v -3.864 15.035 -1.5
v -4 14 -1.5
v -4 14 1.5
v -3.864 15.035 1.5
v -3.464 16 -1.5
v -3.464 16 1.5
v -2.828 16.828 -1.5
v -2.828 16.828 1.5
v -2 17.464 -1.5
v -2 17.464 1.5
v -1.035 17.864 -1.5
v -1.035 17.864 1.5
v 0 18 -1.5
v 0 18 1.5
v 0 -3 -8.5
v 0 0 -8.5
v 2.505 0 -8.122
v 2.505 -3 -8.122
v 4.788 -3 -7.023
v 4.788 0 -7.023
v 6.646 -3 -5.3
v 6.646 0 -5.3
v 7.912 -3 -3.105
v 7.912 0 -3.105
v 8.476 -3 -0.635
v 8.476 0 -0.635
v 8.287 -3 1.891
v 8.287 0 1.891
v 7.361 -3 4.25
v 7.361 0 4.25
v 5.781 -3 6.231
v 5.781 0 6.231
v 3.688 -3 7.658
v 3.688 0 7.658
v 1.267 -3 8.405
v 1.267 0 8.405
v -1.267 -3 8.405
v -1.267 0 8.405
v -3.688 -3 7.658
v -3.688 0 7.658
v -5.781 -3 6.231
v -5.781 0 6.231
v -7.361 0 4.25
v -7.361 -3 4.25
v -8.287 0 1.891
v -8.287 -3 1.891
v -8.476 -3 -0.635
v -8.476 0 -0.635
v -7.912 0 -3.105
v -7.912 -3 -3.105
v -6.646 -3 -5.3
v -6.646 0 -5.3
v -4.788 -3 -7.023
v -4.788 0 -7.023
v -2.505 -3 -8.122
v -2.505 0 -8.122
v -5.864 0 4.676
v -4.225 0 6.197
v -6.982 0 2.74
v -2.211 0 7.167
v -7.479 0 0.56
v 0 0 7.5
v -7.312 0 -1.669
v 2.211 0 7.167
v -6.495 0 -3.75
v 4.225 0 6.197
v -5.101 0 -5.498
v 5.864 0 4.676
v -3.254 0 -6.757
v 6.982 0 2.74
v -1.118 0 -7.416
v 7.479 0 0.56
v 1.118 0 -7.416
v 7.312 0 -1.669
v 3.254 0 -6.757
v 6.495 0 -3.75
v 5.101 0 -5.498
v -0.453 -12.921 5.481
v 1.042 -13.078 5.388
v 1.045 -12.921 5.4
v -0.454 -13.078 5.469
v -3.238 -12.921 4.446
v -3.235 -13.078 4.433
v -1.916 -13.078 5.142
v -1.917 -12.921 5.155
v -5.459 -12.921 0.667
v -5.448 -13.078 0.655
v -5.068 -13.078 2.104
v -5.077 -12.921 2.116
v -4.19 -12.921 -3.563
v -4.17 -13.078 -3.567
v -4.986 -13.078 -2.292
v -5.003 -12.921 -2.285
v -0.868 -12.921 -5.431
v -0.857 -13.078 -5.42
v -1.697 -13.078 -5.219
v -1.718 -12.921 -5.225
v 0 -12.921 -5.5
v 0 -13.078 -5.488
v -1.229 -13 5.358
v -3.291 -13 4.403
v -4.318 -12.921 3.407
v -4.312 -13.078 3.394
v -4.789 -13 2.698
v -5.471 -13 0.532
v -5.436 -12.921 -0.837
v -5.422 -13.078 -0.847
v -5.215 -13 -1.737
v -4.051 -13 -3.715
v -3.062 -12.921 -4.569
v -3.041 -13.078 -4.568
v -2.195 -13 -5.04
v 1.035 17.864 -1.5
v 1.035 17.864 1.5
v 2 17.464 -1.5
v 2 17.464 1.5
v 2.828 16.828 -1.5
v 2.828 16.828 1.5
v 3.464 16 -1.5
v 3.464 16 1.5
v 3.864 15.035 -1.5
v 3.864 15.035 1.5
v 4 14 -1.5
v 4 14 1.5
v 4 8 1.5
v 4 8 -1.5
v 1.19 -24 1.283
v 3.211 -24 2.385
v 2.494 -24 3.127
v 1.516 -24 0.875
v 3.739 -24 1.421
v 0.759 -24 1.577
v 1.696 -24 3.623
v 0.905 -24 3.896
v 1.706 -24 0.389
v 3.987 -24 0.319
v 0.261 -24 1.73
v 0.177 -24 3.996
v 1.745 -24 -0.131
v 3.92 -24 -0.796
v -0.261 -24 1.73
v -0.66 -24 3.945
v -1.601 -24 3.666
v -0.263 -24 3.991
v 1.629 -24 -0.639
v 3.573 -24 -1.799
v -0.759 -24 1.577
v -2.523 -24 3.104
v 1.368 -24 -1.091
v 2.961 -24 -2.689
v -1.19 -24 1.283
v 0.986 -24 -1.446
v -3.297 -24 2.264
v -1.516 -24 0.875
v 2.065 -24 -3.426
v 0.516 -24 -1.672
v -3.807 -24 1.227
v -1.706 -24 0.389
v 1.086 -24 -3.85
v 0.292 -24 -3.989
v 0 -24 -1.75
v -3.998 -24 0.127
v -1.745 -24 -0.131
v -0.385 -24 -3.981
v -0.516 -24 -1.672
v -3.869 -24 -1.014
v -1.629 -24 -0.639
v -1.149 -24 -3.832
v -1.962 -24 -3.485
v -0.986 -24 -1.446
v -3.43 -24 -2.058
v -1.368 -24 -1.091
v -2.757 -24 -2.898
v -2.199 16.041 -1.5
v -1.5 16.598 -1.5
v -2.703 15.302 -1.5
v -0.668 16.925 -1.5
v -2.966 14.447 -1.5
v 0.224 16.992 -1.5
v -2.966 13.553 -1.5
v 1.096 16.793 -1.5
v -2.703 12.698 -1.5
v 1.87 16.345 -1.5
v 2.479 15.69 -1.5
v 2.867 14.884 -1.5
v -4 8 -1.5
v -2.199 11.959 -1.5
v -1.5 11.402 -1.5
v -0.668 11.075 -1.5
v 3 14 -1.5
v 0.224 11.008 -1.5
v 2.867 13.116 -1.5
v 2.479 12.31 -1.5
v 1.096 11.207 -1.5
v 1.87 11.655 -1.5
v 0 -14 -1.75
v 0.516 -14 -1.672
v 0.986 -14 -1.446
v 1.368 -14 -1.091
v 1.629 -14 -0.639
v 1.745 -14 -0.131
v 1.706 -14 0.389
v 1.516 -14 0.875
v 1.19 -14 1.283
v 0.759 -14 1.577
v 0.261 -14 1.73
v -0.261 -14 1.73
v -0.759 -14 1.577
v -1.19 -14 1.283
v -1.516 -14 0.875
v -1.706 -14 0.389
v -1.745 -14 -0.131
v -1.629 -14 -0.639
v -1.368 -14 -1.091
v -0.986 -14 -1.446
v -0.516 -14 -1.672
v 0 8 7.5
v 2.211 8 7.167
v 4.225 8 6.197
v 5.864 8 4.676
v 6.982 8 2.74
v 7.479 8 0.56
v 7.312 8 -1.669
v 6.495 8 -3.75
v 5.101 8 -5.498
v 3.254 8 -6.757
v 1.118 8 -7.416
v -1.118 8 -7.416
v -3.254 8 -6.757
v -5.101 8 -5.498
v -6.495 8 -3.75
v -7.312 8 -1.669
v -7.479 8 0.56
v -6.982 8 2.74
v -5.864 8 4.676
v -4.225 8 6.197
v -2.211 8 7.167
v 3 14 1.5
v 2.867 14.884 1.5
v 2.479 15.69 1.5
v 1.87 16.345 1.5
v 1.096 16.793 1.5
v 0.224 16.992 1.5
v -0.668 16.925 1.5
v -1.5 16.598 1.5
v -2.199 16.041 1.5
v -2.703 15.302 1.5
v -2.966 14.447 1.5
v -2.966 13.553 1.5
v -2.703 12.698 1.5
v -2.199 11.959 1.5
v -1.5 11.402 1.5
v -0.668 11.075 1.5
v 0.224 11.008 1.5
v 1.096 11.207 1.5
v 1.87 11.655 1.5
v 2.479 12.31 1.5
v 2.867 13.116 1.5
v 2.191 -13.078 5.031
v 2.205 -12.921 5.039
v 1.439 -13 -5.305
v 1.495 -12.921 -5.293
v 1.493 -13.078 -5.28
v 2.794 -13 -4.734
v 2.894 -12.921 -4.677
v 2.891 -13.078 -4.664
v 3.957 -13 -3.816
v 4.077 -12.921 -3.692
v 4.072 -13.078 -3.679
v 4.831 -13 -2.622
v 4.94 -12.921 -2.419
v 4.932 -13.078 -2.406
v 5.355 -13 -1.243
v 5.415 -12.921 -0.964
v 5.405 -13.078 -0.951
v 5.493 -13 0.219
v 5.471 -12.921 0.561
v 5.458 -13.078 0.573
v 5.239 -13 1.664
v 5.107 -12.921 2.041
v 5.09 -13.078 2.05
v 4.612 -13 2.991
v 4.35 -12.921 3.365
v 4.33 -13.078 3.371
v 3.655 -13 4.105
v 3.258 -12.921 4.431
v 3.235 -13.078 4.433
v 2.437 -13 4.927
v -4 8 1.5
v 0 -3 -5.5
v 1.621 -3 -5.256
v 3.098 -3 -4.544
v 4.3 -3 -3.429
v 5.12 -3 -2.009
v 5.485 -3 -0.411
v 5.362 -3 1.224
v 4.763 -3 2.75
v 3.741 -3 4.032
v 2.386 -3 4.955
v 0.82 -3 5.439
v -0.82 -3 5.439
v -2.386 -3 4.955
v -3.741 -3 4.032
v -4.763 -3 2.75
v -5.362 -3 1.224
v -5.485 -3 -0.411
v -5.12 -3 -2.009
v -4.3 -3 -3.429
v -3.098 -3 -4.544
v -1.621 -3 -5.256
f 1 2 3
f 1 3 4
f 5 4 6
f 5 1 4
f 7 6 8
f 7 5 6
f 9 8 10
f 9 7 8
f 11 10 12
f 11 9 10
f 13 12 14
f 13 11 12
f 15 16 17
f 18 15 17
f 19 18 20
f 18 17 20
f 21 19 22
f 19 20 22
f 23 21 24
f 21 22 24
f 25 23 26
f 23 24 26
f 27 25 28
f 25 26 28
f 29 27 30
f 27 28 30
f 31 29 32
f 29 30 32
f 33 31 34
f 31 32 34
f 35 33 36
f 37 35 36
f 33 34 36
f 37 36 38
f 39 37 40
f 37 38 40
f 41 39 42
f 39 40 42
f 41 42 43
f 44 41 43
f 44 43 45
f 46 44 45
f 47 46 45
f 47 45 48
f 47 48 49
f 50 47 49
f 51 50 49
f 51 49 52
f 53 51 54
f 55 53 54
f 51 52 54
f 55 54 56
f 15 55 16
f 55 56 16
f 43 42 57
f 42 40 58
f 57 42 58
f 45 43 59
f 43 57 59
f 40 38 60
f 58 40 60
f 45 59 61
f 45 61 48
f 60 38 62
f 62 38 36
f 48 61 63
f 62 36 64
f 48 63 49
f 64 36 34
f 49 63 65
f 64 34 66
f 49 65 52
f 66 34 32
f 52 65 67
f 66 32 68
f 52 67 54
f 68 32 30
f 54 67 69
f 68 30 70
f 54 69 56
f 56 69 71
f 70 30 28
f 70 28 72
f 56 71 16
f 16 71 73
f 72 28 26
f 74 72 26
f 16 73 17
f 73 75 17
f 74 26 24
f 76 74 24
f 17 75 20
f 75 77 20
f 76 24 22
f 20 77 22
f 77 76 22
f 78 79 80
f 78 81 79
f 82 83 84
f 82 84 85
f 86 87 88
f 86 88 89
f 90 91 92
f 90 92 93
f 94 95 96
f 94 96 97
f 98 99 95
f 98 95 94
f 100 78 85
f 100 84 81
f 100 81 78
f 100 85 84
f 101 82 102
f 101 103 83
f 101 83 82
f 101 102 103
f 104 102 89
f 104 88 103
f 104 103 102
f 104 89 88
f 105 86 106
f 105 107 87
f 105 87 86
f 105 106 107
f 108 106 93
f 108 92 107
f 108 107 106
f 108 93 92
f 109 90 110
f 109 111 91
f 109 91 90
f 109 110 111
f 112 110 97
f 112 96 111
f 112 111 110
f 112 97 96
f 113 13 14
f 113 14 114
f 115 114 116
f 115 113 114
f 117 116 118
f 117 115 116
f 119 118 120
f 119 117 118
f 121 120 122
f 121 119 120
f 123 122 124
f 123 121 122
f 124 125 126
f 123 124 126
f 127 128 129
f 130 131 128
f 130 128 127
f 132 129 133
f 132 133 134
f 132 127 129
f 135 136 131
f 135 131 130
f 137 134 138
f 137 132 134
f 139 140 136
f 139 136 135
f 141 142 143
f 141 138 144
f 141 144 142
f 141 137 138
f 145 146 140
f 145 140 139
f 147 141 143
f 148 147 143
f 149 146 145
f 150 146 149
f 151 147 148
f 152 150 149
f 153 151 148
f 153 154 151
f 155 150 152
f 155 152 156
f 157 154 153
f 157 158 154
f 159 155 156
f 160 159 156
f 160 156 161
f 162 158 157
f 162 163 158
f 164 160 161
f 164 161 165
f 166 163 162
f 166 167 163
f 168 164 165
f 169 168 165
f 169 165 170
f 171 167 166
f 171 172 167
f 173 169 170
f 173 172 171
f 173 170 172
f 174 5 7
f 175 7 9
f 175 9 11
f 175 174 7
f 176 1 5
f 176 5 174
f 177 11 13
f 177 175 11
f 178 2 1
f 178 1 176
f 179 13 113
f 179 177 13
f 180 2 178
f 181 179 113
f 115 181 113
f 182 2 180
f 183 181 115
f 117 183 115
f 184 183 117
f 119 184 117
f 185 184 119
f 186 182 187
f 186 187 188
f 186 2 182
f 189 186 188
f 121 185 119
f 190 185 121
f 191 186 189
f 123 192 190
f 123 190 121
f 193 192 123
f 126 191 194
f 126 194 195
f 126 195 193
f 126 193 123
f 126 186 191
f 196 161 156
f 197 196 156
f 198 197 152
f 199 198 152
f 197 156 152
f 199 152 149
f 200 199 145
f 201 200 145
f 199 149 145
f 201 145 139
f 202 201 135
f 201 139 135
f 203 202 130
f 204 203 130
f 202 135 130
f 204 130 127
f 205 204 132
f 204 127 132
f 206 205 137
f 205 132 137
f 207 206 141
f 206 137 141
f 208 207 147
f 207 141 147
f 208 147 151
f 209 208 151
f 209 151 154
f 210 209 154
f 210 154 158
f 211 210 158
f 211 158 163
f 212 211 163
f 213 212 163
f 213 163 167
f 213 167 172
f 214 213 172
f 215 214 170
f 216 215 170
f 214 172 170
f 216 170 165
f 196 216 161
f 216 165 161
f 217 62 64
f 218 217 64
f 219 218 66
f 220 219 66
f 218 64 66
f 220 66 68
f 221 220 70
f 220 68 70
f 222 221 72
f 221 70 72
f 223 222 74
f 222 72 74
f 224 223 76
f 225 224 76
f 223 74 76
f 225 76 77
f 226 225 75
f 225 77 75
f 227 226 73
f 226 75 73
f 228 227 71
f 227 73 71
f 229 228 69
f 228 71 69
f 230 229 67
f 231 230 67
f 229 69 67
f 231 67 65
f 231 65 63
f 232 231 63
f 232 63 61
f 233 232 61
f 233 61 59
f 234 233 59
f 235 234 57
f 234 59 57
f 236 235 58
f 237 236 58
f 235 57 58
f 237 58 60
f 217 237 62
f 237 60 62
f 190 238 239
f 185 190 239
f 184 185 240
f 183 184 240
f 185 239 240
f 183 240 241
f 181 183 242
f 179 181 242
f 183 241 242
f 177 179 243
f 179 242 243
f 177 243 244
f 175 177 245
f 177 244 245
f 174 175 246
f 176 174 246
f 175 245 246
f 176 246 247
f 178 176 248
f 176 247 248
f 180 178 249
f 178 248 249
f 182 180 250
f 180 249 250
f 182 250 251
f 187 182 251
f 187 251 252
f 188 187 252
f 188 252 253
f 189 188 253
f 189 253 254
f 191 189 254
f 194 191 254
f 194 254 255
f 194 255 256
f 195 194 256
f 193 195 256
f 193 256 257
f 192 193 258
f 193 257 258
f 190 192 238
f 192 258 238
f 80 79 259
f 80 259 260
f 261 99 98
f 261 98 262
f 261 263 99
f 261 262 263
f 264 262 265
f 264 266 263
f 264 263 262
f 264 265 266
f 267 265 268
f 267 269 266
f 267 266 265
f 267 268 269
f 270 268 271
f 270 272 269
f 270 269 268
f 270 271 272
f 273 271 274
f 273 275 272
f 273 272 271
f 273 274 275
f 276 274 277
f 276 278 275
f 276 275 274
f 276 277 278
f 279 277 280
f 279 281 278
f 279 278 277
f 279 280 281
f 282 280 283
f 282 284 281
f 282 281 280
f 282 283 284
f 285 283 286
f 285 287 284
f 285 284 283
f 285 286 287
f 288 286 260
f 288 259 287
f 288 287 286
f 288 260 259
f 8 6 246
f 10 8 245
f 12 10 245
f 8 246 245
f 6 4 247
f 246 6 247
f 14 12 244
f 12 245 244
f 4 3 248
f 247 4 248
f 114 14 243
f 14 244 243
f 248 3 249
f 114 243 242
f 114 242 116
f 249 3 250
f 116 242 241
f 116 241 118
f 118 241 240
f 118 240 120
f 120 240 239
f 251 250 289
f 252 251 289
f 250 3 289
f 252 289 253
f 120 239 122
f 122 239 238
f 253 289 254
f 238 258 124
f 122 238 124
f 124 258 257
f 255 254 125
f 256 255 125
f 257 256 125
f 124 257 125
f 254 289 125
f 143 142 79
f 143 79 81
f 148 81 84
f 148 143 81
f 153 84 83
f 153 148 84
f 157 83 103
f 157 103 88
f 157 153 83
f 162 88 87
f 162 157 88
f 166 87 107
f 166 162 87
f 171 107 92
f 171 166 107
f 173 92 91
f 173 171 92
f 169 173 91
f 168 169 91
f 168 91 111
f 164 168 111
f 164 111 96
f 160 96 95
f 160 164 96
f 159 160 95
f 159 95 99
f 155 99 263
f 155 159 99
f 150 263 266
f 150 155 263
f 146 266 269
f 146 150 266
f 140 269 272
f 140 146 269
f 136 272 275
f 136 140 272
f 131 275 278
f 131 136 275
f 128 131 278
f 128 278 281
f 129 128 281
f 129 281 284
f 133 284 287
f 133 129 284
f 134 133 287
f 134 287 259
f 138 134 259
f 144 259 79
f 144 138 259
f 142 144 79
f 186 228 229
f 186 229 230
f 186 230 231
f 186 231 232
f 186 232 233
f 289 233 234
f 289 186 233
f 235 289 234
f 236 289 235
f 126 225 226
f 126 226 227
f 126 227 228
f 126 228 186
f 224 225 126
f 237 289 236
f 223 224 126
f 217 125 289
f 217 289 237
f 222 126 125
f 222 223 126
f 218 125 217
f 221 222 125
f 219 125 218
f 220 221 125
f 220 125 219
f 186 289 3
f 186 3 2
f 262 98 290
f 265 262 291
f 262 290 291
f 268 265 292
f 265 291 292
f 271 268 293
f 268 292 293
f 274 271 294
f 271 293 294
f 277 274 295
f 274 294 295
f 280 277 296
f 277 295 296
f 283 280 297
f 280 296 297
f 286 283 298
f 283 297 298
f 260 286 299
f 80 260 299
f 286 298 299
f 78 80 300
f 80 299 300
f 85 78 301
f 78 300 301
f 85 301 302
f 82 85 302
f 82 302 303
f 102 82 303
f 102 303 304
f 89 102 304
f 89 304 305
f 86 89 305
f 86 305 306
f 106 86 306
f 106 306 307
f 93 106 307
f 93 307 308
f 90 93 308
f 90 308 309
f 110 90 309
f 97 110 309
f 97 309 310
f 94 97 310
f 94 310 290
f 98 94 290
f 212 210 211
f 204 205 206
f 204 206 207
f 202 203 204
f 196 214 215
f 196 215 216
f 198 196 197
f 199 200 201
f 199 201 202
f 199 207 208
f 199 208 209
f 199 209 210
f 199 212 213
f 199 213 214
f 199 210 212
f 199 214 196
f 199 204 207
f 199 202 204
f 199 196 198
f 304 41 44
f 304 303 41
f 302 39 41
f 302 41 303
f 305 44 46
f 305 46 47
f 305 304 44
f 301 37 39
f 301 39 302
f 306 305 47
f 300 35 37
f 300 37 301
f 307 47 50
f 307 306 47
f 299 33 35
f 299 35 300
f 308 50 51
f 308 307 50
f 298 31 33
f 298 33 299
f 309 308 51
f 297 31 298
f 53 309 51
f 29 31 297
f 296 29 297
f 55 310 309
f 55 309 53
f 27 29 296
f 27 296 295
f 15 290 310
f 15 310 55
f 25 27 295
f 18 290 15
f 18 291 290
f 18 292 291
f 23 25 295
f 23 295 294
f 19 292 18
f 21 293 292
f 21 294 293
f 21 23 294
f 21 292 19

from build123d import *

# Parameters (mm, degrees)
ESBO_O1_R                  = 7.5
RESSALTO_EXTRUS_O1_DEPTH   = 8
ESBO_O2_R                  = 8.5
RESSALTO_EXTRUS_O2_DEPTH   = 3
ESBO_O3_W                  = 8
ESBO_O3_H                  = 3
RESSALTO_EXTRUS_O3_DEPTH   = 10
CORTE_EXTRUS_O1_DEPTH      = 23.27666941
CORTE_EXTRUS_O1_DEPTH_BACK = 23.27666941
ESBO_O5_R                  = 3
CORTE_EXTRUS_O2_DEPTH      = 3
ESBO_O6_R                  = 5.5
RESSALTO_EXTRUS_O4_DEPTH   = 10
FILETE1_R                  = 1
SKETCH1_R                  = 1.75
CUT_EXTRUDE1_DEPTH         = 10


with BuildPart() as part:
    # Esboço1 → Ressalto-extrusão1 (new body)
    with BuildSketch(Plane(origin=(0, 0, 0), x_dir=(1, 0, 0), z_dir=(0, 1, 0))):
        with Locations(Location((0, 0, 0), (0, 0, 270))):
            Circle(ESBO_O1_R)
    extrude(amount=RESSALTO_EXTRUS_O1_DEPTH)

    # Esboço2 → Ressalto-extrusão2 (add)
    with BuildSketch(Plane.XZ):
        with Locations(Location((0, 0, 0), (0, 0, 270))):
            Circle(ESBO_O2_R)
    extrude(amount=RESSALTO_EXTRUS_O2_DEPTH)

    # Esboço3 → Ressalto-extrusão3 (add)
    with BuildSketch(Plane(origin=(0, 8, 0), x_dir=(1, 0, 0), z_dir=(0, 1, 0))):
        Rectangle(ESBO_O3_W, ESBO_O3_H)
    extrude(amount=RESSALTO_EXTRUS_O3_DEPTH)

    # Esboço4 → Corte-extrusão1 (cut, two sides: drawn at the far end of the back side and taken through both)
    with BuildSketch(Plane.XY.offset(1.5).offset(-CORTE_EXTRUS_O1_DEPTH_BACK)):
        with BuildLine():
            Line((-4, 18), (-4, 13.999999871))
            ThreePointArc((-4, 13.999999871), (-2.828427176, 16.828427073), (-1.7e-08, 18))
            Line((-1.7e-08, 18), (-4, 18))
        make_face()
        with BuildLine():
            Line((4, 18), (-1.7e-08, 18))
            ThreePointArc((-1.7e-08, 18), (2.828427119, 16.828427131), (4, 14))
            Line((4, 14), (4, 18))
        make_face()
    extrude(amount=CORTE_EXTRUS_O1_DEPTH + CORTE_EXTRUS_O1_DEPTH_BACK, mode=Mode.SUBTRACT)

    # Esboço5 → Corte-extrusão2 (cut)
    with BuildSketch(Plane.XY.offset(1.5)):
        with Locations((0, 14)):
            Circle(ESBO_O5_R)
    extrude(amount=-CORTE_EXTRUS_O2_DEPTH, mode=Mode.SUBTRACT)

    # Esboço6 → Ressalto-extrusão4 (add)
    with BuildSketch(Plane.XZ.offset(3)):
        with Locations(Location((0, 0, 0), (0, 0, 270))):
            Circle(ESBO_O6_R)
    extrude(amount=RESSALTO_EXTRUS_O4_DEPTH)

    # Loft1: read off the stored shape, not the designer's step
    # Loft1: loft between two sections, ruled curve by curve
    loft1_from = [
        Edge.make_bspline([(1.054348973, -13, 5.397994835), (-9.741640698, -13, 7.506692781), (-11.850338644, -13, -3.28929689), (-1.054348973, -13, -5.397994835), (9.741640698, -13, -7.506692781), (11.850338644, -13, 3.28929689), (1.054348973, -13, 5.397994835)], [0, 0, 0, 0, 0.5, 0.5, 0.5, 1, 1, 1, 1], 3, [1, 0.333333333, 0.333333333, 1, 0.333333333, 0.333333333, 1]),
    ]
    loft1_to = [
        Edge.make_bspline([(-0.660465845, -24, 3.945096307), (-8.550658458, -24, 2.624164617), (-7.229726768, -24, -5.266027996), (0.660465845, -24, -3.945096307), (8.550658458, -24, -2.624164617), (7.229726768, -24, 5.266027996), (-0.660465845, -24, 3.945096307)], [0, 0, 0, 0, 0.5, 0.5, 0.5, 1, 1, 1, 1], 3, [1, 0.333333333, 0.333333333, 1, 0.333333333, 0.333333333, 1]),
    ]
    loft1 = Solid(Shell([*[Face.make_surface_from_curves(loft1_from[k], loft1_to[k]) for k in range(1)], Face(Wire(loft1_from)), Face(Wire(loft1_to))]))
    add(loft1)

    # Filete1
    filete1_edges = [part.edges().sort_by_distance(p)[0] for p in [
        (-5.474439314, -13, 0.529635915),
    ]]
    fillet(filete1_edges, radius=FILETE1_R)

    # Sketch1 → Cut-Extrude1 (cut)
    with BuildSketch(Plane.XZ.offset(24)):
        with Locations(Location((0, 0, 0), (0, 0, 270))):
            Circle(SKETCH1_R)
    extrude(amount=-CUT_EXTRUDE1_DEPTH, mode=Mode.SUBTRACT)


solid = part.part
